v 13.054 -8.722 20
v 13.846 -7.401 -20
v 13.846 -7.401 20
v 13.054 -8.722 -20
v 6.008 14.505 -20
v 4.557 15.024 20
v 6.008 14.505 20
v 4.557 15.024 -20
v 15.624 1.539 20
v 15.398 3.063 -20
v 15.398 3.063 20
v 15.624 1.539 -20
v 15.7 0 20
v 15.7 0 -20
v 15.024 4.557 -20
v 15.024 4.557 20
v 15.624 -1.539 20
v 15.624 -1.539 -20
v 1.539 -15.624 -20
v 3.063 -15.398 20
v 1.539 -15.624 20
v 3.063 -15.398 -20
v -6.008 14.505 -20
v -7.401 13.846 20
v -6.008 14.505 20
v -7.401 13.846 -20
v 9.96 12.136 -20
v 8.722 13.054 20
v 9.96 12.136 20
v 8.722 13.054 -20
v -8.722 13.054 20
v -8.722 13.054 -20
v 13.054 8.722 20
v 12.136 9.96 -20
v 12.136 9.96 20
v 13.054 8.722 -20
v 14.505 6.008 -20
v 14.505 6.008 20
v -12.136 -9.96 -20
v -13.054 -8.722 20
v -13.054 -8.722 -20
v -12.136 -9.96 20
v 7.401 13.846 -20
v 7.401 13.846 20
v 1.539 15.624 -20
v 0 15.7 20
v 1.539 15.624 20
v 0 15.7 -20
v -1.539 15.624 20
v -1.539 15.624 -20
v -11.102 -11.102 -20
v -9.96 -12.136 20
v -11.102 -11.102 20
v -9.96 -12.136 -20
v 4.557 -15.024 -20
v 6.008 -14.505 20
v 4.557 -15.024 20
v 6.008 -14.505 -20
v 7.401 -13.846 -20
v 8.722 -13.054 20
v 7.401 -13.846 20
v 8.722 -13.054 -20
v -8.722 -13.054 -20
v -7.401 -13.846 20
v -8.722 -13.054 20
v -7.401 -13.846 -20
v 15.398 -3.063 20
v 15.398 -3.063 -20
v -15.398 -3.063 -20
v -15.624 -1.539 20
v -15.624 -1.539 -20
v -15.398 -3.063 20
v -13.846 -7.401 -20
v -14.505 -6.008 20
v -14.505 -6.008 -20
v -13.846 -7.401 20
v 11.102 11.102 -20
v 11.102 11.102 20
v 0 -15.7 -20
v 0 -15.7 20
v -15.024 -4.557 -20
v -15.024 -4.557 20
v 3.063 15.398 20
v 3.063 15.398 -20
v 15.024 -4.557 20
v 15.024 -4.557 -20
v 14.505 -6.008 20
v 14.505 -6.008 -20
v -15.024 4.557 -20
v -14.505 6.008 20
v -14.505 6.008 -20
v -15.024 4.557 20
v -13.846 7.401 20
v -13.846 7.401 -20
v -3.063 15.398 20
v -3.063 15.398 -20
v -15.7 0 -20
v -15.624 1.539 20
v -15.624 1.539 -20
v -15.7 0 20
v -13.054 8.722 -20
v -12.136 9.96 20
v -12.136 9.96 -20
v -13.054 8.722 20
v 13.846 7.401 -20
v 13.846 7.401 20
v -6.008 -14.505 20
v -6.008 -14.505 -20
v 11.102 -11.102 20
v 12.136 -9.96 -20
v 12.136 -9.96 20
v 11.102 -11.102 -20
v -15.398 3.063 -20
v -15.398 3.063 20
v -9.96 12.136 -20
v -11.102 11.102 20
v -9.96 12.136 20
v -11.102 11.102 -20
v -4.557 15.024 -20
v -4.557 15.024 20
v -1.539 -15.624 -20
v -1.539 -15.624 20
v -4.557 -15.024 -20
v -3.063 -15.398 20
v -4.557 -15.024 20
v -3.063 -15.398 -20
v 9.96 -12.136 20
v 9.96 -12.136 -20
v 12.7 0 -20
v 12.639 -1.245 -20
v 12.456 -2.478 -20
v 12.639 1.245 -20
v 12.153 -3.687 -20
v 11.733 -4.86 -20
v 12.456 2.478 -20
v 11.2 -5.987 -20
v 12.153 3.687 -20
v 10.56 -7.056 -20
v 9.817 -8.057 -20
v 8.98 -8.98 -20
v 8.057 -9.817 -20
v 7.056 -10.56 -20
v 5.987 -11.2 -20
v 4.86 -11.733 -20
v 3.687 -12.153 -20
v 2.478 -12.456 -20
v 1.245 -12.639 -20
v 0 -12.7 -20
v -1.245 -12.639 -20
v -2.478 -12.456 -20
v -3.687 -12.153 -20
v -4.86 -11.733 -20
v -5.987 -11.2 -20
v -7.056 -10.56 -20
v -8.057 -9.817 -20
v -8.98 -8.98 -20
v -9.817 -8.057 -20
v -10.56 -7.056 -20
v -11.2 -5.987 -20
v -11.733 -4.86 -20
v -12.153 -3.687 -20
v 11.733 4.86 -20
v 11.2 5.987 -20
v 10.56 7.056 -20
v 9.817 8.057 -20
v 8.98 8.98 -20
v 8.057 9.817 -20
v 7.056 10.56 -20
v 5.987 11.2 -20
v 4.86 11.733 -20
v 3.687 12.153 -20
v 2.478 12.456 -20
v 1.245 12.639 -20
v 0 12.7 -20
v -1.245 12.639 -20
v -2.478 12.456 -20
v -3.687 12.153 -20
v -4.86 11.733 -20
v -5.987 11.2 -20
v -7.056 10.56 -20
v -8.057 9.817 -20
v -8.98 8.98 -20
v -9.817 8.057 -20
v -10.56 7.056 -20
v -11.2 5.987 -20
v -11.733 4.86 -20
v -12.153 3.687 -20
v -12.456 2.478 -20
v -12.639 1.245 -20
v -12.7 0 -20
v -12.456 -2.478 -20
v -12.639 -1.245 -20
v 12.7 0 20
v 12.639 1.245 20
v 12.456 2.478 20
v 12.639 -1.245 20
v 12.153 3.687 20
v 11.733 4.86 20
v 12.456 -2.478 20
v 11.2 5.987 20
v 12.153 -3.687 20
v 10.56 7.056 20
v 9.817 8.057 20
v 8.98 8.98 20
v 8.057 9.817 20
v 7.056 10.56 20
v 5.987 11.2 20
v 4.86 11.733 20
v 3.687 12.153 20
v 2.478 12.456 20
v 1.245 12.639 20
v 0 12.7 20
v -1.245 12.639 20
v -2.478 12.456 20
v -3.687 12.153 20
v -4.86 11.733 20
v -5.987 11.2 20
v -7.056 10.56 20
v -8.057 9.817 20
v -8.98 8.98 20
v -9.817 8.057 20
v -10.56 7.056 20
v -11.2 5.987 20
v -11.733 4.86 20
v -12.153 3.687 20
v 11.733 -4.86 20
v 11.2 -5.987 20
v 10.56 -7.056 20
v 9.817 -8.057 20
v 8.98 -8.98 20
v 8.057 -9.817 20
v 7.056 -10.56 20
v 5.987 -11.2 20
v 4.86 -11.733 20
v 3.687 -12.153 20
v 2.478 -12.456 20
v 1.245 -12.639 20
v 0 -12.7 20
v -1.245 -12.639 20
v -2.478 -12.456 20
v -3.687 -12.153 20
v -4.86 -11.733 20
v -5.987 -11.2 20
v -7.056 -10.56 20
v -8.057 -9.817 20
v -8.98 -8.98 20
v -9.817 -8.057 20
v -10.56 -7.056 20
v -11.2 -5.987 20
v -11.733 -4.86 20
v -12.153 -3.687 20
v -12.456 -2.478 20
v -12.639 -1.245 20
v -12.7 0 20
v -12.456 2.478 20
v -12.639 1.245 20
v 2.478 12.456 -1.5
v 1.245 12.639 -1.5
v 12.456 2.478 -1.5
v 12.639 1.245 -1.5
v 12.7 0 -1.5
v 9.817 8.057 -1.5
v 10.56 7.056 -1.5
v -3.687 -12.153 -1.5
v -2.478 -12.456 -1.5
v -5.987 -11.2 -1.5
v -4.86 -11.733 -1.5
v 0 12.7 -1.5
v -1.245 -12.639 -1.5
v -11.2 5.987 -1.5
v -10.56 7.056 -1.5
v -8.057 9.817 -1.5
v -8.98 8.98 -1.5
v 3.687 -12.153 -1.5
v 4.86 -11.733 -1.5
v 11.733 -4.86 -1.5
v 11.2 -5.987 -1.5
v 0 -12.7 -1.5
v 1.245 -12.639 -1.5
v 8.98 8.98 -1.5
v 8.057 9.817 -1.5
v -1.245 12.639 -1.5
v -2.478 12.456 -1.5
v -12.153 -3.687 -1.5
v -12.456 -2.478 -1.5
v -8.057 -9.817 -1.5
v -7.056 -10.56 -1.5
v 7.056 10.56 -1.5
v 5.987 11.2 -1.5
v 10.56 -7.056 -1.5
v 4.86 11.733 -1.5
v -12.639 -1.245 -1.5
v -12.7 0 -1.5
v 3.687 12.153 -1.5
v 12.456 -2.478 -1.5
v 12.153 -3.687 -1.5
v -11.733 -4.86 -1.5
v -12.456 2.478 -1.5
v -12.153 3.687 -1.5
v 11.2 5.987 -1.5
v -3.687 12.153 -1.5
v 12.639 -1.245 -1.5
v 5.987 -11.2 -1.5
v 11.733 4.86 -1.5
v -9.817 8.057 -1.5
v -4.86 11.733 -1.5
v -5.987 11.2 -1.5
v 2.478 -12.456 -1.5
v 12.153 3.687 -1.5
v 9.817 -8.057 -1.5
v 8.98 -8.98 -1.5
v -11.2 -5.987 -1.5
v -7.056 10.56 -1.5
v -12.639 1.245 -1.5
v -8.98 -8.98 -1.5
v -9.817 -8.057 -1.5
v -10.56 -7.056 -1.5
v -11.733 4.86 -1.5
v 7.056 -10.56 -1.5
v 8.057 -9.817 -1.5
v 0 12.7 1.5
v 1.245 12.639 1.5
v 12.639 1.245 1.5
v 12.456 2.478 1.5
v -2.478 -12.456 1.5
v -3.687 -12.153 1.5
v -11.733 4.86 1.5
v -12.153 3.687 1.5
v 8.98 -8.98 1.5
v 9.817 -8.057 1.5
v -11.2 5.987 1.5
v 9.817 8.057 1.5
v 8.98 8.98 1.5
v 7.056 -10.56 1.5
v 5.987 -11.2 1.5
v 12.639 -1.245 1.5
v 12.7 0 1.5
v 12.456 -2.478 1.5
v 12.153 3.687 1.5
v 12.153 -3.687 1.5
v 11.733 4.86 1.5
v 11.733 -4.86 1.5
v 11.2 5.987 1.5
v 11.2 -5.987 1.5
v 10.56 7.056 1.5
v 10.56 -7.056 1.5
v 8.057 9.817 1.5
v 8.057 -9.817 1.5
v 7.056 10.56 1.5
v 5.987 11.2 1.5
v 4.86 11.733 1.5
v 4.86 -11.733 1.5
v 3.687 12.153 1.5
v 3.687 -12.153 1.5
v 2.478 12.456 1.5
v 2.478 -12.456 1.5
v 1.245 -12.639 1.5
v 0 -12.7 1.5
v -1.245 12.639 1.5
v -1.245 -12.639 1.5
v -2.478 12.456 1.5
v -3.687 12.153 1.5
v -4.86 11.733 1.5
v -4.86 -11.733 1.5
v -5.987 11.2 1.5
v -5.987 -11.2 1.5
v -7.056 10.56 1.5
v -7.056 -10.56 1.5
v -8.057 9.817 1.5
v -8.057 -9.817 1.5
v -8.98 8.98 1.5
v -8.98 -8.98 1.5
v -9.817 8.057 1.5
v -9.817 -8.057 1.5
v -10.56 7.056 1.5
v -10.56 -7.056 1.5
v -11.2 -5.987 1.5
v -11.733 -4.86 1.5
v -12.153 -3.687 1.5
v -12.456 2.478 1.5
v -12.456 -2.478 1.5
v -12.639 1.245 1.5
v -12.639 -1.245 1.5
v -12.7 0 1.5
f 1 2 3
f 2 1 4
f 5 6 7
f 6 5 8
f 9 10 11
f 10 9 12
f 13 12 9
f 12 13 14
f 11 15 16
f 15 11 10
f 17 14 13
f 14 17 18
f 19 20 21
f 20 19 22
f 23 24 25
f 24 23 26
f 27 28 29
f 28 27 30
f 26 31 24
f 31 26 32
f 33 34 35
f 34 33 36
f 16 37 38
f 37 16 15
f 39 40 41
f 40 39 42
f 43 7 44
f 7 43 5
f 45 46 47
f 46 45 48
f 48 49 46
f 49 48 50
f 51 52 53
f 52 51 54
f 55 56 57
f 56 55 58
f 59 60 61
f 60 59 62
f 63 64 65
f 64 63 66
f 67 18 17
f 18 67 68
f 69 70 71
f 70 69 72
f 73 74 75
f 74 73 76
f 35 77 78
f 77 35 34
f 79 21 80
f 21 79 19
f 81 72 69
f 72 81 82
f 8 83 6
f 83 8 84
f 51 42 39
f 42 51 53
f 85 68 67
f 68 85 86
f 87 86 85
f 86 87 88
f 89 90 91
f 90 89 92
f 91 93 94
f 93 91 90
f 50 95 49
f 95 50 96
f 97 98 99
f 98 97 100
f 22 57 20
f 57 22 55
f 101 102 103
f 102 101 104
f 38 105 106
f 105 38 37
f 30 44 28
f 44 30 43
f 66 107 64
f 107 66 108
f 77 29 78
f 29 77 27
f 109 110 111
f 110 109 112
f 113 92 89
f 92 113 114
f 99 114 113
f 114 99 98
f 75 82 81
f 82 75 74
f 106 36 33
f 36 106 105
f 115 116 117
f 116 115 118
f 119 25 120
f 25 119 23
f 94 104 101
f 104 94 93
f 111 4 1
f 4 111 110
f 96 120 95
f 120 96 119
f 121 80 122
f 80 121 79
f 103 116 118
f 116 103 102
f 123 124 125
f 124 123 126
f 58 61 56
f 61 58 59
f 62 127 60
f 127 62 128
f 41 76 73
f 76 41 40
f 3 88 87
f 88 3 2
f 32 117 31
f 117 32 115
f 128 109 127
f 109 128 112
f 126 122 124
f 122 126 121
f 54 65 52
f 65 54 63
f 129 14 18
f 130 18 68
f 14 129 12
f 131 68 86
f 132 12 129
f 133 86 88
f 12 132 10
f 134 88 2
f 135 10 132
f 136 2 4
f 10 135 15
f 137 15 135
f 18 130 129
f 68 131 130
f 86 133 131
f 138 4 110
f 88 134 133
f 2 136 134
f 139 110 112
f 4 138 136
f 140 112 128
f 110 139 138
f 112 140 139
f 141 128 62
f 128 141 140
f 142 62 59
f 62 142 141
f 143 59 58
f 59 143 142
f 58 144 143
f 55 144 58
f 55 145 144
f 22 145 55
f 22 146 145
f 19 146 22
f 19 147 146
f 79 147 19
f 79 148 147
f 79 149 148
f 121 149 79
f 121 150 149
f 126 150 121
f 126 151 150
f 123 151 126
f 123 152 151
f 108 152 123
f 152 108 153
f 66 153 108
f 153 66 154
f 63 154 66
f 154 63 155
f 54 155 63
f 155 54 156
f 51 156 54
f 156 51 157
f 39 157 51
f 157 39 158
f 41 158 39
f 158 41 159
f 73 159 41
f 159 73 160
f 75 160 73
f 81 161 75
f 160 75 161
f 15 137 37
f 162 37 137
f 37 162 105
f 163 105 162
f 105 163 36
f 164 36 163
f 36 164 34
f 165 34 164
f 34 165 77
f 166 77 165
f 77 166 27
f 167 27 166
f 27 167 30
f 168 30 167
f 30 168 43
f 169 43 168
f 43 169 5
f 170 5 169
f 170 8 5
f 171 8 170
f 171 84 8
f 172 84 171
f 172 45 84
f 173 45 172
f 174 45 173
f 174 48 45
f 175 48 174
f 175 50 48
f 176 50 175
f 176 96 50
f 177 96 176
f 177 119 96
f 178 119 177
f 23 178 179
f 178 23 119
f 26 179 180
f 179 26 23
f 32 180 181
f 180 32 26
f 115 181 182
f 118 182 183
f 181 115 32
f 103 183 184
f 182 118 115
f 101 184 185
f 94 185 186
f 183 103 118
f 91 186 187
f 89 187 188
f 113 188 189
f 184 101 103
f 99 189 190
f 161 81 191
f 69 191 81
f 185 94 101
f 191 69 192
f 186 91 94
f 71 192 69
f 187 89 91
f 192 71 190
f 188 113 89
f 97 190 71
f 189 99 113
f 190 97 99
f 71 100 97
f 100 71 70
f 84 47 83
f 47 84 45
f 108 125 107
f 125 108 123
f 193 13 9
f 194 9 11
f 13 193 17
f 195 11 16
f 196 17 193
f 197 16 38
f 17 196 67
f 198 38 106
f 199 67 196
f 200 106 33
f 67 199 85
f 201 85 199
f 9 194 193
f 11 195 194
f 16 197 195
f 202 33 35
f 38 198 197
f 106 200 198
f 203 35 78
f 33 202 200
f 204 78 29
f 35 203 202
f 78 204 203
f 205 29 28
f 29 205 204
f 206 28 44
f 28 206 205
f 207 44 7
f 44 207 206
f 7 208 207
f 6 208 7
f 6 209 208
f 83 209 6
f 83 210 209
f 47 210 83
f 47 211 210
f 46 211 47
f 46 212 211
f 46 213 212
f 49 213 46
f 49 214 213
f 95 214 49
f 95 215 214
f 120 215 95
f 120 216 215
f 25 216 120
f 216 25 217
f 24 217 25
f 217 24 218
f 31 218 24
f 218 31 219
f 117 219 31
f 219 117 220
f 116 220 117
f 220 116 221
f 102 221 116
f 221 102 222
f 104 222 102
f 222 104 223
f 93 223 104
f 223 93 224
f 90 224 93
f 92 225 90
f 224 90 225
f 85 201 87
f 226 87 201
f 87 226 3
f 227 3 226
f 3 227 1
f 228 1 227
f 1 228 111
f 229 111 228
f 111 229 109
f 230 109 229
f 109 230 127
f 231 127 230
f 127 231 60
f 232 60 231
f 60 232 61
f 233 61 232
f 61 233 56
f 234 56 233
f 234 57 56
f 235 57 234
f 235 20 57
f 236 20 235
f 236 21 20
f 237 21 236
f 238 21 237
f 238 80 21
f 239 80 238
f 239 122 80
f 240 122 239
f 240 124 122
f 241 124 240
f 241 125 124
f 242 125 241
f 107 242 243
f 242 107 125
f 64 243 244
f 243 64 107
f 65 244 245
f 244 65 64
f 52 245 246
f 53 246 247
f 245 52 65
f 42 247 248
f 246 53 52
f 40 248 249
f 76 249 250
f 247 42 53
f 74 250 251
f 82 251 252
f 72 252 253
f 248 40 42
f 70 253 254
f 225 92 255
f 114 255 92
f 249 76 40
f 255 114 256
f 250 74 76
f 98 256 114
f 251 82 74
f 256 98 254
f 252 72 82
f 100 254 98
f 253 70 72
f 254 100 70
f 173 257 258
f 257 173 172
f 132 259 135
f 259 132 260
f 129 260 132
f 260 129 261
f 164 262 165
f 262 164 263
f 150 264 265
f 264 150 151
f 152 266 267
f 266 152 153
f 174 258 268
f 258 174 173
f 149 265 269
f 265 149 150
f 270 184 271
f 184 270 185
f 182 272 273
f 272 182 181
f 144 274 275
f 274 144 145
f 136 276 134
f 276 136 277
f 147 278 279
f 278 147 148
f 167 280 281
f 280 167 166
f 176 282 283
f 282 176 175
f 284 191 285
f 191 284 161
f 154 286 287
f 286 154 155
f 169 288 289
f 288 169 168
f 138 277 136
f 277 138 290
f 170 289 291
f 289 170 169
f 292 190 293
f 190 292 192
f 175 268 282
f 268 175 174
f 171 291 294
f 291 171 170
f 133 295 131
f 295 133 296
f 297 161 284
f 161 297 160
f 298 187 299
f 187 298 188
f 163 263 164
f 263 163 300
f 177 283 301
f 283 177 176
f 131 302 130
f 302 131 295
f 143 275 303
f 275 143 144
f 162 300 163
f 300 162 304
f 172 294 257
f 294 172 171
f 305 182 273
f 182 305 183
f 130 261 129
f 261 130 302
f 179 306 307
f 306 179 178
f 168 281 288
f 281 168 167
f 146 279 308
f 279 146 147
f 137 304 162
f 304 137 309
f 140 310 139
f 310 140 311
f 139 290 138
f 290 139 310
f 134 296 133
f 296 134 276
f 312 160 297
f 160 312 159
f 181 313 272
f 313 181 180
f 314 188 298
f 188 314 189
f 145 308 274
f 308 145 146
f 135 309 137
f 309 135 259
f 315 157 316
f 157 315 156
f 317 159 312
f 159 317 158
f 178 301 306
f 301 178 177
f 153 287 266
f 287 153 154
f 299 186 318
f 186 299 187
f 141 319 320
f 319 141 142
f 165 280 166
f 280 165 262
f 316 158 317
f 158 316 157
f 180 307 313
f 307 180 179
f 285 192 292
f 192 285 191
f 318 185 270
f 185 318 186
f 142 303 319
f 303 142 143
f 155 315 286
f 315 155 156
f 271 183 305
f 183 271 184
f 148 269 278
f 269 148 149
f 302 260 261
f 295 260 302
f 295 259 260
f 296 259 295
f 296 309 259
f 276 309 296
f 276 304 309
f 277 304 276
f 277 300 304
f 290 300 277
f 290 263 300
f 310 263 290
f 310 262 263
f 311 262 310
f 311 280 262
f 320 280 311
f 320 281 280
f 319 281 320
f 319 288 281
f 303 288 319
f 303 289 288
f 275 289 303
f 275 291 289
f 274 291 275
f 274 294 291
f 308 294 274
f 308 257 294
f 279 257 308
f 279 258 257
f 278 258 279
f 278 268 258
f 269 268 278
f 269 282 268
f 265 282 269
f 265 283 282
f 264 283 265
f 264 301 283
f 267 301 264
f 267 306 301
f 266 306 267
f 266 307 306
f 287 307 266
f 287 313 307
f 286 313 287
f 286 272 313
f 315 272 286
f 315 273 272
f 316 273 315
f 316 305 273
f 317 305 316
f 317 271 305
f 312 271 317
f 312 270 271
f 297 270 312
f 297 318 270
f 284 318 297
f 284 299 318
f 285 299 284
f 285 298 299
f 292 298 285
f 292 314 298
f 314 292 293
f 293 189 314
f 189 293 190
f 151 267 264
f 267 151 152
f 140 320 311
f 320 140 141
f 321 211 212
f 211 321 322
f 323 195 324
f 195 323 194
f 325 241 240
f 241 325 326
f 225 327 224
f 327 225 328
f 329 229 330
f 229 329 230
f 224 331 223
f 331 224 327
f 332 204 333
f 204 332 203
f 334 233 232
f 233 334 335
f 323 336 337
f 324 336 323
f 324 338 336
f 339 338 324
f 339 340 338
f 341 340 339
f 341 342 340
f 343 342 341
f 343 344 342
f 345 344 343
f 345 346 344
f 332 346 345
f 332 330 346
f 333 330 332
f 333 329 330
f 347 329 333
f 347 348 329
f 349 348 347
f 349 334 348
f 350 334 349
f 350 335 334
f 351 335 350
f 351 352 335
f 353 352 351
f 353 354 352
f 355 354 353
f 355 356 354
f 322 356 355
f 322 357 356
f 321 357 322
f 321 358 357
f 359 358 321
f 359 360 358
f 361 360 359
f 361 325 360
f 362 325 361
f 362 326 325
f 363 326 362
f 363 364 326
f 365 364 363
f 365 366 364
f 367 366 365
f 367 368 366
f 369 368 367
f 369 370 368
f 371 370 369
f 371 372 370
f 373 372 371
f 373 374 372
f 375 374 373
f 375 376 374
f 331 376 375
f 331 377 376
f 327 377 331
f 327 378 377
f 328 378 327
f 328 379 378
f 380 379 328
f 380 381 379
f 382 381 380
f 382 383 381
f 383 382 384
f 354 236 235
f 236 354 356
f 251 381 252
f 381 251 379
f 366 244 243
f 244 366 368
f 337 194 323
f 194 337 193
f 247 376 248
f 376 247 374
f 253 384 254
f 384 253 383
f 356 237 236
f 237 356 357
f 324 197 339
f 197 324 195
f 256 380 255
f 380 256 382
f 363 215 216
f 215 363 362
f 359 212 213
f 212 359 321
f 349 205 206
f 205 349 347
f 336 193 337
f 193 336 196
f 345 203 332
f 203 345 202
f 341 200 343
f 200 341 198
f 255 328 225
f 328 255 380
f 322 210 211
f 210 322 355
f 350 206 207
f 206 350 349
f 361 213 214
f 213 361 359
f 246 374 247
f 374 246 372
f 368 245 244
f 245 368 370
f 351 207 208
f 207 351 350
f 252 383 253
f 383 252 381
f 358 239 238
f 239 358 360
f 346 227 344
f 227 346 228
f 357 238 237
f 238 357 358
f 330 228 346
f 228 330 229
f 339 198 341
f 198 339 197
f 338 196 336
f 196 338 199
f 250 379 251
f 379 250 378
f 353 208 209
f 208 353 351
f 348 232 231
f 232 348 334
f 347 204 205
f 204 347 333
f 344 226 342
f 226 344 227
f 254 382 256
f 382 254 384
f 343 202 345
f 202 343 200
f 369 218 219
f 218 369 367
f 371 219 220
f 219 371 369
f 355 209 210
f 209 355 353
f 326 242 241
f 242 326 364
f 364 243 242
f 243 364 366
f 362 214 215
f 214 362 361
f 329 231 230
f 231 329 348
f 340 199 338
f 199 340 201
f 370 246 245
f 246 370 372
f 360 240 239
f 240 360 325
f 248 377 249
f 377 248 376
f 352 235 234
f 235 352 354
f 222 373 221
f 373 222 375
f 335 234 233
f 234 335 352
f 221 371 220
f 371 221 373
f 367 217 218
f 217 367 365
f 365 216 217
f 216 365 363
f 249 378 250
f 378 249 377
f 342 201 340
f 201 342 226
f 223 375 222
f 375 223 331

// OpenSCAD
// Parametric Pipe Coupling (straight connector)
// Parameters are injected via OpenSCAD -D flags

// Pipe inner diameter (mm)
pipe_id = 25.4;
// Wall thickness (mm)
wall_thickness = 3;
// Total coupling length (mm)
length = 40;
// Internal stop ridge width (mm)
ridge_width = 3;
// Resolution
$fn = 64;

pipe_od = pipe_id + 2 * wall_thickness;

module coupling() {
    difference() {
        // Outer cylinder
        cylinder(h = length, d = pipe_od, center = true);

        // Inner bore - left side
        translate([0, 0, -length/2 - 0.1])
            cylinder(h = length/2 - ridge_width/2 + 0.1, d = pipe_id);

        // Inner bore - right side
        translate([0, 0, ridge_width/2])
            cylinder(h = length/2 - ridge_width/2 + 0.1, d = pipe_id);
    }
}

coupling();
